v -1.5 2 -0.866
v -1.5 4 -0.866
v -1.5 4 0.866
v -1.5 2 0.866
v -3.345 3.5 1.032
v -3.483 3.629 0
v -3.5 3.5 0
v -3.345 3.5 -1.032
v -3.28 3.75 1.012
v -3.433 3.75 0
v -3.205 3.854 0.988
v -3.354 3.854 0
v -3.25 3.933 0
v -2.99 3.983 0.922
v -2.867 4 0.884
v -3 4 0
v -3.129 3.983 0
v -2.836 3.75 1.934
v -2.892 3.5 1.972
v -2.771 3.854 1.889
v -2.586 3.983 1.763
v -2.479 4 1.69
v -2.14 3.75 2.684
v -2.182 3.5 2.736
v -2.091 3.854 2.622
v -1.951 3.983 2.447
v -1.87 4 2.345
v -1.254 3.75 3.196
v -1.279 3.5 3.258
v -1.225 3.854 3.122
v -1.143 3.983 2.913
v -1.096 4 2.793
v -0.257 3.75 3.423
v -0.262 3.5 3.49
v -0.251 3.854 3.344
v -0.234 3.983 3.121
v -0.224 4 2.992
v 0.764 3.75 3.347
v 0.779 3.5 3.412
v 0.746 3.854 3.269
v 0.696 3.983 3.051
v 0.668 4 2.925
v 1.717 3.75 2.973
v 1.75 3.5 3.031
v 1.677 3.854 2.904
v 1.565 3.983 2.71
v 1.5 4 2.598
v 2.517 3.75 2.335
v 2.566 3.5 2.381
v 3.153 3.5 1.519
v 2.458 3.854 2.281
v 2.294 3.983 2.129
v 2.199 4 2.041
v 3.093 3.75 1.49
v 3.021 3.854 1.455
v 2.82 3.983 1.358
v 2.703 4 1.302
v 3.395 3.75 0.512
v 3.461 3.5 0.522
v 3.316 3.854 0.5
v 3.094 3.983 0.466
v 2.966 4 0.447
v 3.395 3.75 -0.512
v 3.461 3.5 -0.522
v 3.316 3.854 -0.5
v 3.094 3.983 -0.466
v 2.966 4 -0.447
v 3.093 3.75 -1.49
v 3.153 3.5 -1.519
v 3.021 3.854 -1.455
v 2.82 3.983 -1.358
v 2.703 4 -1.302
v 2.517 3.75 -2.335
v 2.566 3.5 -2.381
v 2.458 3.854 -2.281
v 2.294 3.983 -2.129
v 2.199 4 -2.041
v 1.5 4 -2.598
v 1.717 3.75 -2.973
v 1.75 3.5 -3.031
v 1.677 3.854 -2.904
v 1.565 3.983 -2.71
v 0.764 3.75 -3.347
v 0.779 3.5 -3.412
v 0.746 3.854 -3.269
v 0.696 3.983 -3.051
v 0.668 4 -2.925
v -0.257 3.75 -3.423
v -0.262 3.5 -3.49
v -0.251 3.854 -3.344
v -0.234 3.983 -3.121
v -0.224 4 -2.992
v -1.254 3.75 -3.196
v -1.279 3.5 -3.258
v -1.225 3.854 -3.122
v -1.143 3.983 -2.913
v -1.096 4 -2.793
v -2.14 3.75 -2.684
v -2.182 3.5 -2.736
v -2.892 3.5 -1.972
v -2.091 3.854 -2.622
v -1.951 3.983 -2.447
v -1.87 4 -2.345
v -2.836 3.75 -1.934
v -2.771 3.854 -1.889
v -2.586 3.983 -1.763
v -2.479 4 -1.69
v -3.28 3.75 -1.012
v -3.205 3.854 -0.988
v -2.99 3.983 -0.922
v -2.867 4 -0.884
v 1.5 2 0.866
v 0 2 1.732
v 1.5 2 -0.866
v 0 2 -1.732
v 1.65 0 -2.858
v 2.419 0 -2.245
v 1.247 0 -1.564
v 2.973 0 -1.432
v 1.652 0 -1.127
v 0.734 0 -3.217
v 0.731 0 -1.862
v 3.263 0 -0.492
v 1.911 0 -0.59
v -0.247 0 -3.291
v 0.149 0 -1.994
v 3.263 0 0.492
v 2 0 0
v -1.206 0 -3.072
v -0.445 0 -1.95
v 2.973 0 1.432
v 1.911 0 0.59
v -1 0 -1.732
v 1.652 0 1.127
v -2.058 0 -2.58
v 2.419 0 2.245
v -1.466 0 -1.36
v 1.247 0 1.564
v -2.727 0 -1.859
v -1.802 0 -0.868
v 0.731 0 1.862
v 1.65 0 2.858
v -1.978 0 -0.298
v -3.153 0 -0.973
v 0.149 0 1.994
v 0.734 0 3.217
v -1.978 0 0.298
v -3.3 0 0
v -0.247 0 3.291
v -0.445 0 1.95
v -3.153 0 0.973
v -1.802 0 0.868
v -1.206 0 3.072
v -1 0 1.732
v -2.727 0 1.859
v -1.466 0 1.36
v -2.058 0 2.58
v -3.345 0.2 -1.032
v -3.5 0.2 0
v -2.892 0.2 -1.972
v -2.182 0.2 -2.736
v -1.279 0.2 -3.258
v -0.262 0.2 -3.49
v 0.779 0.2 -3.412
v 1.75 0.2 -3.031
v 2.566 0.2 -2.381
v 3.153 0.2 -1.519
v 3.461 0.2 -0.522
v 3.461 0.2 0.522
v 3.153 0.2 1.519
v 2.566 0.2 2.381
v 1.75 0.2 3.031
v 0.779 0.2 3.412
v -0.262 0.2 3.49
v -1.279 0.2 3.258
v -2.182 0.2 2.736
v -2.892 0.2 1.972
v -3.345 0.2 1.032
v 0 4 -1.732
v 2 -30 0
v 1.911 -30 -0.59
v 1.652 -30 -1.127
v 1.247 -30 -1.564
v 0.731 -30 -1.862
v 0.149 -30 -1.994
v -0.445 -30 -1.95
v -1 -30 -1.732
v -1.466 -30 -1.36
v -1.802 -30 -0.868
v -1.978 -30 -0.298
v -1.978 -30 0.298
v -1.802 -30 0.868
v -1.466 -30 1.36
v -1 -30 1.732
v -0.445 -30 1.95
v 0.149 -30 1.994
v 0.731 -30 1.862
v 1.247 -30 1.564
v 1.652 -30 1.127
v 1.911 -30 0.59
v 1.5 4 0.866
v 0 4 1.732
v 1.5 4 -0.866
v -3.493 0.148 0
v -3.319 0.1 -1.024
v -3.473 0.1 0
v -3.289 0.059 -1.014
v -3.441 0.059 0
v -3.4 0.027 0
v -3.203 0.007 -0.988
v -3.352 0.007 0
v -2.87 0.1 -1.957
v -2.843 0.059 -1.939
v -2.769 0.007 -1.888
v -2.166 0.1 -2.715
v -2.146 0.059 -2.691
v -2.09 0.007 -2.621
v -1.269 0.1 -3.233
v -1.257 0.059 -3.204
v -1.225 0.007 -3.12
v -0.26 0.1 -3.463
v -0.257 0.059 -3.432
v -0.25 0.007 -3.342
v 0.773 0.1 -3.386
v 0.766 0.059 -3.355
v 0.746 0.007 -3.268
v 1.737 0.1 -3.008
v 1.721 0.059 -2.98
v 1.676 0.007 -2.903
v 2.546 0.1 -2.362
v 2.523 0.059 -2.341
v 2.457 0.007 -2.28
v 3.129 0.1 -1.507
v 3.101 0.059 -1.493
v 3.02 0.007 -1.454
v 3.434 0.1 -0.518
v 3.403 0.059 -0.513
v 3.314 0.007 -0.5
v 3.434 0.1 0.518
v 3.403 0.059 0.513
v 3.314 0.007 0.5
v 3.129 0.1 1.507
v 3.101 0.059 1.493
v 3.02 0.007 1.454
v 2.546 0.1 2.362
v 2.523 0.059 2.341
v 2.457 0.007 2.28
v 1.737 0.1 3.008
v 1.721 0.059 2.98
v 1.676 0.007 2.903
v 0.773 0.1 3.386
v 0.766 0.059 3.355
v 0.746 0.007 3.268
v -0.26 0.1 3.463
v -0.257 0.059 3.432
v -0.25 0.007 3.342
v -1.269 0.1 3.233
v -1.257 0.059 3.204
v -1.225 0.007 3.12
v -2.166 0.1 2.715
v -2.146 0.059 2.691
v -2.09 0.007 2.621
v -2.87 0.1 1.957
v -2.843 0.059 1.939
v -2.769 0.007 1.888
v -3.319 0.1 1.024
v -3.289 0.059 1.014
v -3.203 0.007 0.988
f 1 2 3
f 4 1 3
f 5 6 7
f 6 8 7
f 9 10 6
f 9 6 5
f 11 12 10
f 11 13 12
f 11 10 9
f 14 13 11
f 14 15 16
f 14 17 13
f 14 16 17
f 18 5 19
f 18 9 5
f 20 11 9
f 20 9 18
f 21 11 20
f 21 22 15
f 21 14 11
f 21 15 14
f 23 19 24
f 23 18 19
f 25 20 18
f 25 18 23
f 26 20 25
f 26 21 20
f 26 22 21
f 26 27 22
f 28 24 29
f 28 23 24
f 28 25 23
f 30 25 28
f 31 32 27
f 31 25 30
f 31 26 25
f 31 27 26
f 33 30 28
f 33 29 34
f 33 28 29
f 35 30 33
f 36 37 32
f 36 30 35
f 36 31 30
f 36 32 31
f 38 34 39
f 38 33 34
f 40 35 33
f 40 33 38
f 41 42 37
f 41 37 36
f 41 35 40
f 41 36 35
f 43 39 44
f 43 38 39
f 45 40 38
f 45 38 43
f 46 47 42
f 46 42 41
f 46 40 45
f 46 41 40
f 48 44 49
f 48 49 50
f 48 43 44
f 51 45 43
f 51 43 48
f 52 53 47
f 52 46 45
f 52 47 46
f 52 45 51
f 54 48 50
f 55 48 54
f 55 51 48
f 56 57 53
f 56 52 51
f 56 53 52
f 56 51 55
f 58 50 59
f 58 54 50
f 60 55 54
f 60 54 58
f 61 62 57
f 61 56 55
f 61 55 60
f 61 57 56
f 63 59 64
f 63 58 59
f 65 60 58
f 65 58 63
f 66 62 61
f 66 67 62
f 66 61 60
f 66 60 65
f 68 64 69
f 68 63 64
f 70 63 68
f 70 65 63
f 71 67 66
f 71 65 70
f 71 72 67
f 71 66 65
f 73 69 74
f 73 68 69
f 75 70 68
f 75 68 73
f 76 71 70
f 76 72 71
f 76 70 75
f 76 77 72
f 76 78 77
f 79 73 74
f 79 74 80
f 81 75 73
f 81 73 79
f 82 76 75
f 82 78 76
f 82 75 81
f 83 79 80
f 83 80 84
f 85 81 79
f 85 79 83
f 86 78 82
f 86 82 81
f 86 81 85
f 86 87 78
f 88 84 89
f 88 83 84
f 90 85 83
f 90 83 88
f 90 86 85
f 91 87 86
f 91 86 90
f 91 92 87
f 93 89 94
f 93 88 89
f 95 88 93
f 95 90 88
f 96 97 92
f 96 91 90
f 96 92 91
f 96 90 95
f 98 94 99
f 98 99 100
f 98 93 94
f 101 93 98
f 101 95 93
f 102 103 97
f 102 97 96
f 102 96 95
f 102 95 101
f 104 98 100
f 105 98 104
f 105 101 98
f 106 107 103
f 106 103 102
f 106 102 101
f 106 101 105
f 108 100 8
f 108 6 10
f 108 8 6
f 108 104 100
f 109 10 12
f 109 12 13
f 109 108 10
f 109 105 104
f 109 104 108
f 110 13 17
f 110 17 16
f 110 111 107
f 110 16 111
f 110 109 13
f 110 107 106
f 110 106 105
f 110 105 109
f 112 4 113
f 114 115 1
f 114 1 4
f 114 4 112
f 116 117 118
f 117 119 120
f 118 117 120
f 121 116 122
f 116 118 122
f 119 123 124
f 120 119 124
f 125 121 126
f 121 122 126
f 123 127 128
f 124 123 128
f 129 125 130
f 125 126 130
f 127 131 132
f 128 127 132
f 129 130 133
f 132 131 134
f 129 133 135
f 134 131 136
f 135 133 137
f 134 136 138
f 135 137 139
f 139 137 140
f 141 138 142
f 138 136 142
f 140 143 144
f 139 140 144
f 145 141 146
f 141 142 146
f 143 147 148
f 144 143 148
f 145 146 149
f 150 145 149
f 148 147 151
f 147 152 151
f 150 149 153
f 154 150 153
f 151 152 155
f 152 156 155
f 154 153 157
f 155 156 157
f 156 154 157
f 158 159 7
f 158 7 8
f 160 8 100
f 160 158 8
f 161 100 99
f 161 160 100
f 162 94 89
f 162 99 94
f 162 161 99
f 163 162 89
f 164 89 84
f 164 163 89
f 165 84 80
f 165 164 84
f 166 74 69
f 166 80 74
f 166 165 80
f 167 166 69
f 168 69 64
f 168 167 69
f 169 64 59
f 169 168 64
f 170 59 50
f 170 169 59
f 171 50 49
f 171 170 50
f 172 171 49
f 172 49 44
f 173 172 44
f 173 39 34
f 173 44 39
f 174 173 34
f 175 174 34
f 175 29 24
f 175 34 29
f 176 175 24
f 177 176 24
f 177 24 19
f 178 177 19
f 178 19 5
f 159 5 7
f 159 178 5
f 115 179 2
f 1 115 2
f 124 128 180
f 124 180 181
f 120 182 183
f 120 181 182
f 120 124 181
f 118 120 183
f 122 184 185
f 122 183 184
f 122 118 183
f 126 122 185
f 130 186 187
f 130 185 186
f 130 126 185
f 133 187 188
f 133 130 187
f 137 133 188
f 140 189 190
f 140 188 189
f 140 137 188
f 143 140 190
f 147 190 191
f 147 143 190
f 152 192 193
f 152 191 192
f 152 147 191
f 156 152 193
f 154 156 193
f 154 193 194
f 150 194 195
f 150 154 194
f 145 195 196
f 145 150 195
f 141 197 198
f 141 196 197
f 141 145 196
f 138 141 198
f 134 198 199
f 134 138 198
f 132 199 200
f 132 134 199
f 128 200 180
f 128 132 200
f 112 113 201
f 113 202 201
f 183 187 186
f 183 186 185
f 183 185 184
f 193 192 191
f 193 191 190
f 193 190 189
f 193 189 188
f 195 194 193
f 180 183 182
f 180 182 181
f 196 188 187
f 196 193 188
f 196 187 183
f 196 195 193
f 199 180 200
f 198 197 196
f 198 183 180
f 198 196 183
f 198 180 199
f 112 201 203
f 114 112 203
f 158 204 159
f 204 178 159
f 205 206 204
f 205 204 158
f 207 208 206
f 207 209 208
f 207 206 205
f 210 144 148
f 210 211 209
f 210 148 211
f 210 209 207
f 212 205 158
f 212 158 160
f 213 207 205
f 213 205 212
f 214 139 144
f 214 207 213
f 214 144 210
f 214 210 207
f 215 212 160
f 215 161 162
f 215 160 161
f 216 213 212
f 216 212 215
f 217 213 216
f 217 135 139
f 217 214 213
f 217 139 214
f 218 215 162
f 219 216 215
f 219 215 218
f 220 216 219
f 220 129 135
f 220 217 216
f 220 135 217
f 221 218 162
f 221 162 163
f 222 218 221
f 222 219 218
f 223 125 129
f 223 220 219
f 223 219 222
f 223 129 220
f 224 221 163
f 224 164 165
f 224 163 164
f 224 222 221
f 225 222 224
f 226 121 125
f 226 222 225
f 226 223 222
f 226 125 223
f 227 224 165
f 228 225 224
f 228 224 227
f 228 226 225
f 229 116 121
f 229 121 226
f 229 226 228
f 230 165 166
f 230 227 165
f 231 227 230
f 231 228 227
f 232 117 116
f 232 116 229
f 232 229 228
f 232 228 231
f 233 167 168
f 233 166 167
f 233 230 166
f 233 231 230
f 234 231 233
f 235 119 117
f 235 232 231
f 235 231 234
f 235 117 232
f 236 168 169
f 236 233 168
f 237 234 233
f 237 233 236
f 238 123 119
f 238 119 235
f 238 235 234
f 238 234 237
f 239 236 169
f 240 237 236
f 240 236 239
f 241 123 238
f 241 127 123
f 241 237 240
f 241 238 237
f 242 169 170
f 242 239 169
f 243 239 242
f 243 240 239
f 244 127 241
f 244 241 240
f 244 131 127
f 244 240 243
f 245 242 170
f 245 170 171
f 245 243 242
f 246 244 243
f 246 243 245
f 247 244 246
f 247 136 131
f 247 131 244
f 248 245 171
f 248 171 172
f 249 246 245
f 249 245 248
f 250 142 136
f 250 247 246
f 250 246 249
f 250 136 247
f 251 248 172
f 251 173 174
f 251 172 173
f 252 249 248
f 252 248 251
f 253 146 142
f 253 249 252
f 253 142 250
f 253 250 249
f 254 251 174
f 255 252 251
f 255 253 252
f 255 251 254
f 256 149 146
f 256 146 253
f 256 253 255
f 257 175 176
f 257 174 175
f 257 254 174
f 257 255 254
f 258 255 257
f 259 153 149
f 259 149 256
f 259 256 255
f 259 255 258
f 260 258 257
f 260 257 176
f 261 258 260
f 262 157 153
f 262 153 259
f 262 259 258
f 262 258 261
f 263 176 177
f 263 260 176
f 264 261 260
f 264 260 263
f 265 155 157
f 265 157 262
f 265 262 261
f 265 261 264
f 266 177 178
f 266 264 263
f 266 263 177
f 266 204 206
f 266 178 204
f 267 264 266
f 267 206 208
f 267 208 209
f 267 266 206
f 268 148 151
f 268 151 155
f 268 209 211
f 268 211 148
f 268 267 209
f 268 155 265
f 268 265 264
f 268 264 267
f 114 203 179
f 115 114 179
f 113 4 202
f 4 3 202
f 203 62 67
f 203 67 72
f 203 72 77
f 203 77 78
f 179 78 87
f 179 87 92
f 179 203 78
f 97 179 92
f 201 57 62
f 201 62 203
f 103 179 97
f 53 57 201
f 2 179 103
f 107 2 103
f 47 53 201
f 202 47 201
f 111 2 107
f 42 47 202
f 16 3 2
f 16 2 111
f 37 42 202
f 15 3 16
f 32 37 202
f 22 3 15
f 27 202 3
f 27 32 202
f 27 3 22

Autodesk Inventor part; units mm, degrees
ref_plane "YZ Plane" through (0, 0, 0) normal (1, 0, 0) x (0, 1, 0)
ref_plane "XZ Plane" through (0, 0, 0) normal (0, 1, 0) x (-1, 0, 0)
ref_plane "XY Plane" through (0, 0, 0) normal (0, 0, 1) x (1, 0, 0)
sketch "スケッチ1" plane through (0, 0, 0) normal (0, 1, 0) x (-1, 0, 0)
  circle A0 centre (0, 0) radius 3.5
  dimension "d0" = 7
extrude "押し出し1" add sketch "スケッチ1" along normal blind 4
sketch "スケッチ2" plane through (0, 0, 0) normal (0, -1, 0) x (1, 0, 0)
  circle A0 centre (0, 0) radius 2
  dimension "d3" = 4
extrude "押し出し2" add sketch "スケッチ2" along normal blind 30
fillet "フィレット1" radius 0.5 1 edges at (3.5, 4, 0)
fillet "フィレット1" radius 0.2 1 edges at (3.5, 0, 0)
sketch "スケッチ3" plane through (0, 4, 0) normal (0, 1, 0) x (1, 0, 0)
  line L0 (0, 1.7321) -> (-1.5, 0.866)
  line L1 (-1.5, 0.866) -> (-1.5, -0.866)
  line L2 (-1.5, -0.866) -> (0, -1.7321)
  line L3 (0, -1.7321) -> (1.5, -0.866)
  line L4 (1.5, -0.866) -> (1.5, 0.866)
  line L5 (1.5, 0.866) -> (0, 1.7321)
  line L6 (0, 1.7321) -> (0, -1.7321) construction
  circle A0 centre (0, 0) radius 1.7321 construction
  dimension "d12" = 3
extrude "押し出し3" cut sketch "スケッチ3" against normal blind 2
thread "ねじ1" size "M4x0.7" class "6g" standard "ANSI Metric M Profile" full length
properties part number "M3-CapScrew"
